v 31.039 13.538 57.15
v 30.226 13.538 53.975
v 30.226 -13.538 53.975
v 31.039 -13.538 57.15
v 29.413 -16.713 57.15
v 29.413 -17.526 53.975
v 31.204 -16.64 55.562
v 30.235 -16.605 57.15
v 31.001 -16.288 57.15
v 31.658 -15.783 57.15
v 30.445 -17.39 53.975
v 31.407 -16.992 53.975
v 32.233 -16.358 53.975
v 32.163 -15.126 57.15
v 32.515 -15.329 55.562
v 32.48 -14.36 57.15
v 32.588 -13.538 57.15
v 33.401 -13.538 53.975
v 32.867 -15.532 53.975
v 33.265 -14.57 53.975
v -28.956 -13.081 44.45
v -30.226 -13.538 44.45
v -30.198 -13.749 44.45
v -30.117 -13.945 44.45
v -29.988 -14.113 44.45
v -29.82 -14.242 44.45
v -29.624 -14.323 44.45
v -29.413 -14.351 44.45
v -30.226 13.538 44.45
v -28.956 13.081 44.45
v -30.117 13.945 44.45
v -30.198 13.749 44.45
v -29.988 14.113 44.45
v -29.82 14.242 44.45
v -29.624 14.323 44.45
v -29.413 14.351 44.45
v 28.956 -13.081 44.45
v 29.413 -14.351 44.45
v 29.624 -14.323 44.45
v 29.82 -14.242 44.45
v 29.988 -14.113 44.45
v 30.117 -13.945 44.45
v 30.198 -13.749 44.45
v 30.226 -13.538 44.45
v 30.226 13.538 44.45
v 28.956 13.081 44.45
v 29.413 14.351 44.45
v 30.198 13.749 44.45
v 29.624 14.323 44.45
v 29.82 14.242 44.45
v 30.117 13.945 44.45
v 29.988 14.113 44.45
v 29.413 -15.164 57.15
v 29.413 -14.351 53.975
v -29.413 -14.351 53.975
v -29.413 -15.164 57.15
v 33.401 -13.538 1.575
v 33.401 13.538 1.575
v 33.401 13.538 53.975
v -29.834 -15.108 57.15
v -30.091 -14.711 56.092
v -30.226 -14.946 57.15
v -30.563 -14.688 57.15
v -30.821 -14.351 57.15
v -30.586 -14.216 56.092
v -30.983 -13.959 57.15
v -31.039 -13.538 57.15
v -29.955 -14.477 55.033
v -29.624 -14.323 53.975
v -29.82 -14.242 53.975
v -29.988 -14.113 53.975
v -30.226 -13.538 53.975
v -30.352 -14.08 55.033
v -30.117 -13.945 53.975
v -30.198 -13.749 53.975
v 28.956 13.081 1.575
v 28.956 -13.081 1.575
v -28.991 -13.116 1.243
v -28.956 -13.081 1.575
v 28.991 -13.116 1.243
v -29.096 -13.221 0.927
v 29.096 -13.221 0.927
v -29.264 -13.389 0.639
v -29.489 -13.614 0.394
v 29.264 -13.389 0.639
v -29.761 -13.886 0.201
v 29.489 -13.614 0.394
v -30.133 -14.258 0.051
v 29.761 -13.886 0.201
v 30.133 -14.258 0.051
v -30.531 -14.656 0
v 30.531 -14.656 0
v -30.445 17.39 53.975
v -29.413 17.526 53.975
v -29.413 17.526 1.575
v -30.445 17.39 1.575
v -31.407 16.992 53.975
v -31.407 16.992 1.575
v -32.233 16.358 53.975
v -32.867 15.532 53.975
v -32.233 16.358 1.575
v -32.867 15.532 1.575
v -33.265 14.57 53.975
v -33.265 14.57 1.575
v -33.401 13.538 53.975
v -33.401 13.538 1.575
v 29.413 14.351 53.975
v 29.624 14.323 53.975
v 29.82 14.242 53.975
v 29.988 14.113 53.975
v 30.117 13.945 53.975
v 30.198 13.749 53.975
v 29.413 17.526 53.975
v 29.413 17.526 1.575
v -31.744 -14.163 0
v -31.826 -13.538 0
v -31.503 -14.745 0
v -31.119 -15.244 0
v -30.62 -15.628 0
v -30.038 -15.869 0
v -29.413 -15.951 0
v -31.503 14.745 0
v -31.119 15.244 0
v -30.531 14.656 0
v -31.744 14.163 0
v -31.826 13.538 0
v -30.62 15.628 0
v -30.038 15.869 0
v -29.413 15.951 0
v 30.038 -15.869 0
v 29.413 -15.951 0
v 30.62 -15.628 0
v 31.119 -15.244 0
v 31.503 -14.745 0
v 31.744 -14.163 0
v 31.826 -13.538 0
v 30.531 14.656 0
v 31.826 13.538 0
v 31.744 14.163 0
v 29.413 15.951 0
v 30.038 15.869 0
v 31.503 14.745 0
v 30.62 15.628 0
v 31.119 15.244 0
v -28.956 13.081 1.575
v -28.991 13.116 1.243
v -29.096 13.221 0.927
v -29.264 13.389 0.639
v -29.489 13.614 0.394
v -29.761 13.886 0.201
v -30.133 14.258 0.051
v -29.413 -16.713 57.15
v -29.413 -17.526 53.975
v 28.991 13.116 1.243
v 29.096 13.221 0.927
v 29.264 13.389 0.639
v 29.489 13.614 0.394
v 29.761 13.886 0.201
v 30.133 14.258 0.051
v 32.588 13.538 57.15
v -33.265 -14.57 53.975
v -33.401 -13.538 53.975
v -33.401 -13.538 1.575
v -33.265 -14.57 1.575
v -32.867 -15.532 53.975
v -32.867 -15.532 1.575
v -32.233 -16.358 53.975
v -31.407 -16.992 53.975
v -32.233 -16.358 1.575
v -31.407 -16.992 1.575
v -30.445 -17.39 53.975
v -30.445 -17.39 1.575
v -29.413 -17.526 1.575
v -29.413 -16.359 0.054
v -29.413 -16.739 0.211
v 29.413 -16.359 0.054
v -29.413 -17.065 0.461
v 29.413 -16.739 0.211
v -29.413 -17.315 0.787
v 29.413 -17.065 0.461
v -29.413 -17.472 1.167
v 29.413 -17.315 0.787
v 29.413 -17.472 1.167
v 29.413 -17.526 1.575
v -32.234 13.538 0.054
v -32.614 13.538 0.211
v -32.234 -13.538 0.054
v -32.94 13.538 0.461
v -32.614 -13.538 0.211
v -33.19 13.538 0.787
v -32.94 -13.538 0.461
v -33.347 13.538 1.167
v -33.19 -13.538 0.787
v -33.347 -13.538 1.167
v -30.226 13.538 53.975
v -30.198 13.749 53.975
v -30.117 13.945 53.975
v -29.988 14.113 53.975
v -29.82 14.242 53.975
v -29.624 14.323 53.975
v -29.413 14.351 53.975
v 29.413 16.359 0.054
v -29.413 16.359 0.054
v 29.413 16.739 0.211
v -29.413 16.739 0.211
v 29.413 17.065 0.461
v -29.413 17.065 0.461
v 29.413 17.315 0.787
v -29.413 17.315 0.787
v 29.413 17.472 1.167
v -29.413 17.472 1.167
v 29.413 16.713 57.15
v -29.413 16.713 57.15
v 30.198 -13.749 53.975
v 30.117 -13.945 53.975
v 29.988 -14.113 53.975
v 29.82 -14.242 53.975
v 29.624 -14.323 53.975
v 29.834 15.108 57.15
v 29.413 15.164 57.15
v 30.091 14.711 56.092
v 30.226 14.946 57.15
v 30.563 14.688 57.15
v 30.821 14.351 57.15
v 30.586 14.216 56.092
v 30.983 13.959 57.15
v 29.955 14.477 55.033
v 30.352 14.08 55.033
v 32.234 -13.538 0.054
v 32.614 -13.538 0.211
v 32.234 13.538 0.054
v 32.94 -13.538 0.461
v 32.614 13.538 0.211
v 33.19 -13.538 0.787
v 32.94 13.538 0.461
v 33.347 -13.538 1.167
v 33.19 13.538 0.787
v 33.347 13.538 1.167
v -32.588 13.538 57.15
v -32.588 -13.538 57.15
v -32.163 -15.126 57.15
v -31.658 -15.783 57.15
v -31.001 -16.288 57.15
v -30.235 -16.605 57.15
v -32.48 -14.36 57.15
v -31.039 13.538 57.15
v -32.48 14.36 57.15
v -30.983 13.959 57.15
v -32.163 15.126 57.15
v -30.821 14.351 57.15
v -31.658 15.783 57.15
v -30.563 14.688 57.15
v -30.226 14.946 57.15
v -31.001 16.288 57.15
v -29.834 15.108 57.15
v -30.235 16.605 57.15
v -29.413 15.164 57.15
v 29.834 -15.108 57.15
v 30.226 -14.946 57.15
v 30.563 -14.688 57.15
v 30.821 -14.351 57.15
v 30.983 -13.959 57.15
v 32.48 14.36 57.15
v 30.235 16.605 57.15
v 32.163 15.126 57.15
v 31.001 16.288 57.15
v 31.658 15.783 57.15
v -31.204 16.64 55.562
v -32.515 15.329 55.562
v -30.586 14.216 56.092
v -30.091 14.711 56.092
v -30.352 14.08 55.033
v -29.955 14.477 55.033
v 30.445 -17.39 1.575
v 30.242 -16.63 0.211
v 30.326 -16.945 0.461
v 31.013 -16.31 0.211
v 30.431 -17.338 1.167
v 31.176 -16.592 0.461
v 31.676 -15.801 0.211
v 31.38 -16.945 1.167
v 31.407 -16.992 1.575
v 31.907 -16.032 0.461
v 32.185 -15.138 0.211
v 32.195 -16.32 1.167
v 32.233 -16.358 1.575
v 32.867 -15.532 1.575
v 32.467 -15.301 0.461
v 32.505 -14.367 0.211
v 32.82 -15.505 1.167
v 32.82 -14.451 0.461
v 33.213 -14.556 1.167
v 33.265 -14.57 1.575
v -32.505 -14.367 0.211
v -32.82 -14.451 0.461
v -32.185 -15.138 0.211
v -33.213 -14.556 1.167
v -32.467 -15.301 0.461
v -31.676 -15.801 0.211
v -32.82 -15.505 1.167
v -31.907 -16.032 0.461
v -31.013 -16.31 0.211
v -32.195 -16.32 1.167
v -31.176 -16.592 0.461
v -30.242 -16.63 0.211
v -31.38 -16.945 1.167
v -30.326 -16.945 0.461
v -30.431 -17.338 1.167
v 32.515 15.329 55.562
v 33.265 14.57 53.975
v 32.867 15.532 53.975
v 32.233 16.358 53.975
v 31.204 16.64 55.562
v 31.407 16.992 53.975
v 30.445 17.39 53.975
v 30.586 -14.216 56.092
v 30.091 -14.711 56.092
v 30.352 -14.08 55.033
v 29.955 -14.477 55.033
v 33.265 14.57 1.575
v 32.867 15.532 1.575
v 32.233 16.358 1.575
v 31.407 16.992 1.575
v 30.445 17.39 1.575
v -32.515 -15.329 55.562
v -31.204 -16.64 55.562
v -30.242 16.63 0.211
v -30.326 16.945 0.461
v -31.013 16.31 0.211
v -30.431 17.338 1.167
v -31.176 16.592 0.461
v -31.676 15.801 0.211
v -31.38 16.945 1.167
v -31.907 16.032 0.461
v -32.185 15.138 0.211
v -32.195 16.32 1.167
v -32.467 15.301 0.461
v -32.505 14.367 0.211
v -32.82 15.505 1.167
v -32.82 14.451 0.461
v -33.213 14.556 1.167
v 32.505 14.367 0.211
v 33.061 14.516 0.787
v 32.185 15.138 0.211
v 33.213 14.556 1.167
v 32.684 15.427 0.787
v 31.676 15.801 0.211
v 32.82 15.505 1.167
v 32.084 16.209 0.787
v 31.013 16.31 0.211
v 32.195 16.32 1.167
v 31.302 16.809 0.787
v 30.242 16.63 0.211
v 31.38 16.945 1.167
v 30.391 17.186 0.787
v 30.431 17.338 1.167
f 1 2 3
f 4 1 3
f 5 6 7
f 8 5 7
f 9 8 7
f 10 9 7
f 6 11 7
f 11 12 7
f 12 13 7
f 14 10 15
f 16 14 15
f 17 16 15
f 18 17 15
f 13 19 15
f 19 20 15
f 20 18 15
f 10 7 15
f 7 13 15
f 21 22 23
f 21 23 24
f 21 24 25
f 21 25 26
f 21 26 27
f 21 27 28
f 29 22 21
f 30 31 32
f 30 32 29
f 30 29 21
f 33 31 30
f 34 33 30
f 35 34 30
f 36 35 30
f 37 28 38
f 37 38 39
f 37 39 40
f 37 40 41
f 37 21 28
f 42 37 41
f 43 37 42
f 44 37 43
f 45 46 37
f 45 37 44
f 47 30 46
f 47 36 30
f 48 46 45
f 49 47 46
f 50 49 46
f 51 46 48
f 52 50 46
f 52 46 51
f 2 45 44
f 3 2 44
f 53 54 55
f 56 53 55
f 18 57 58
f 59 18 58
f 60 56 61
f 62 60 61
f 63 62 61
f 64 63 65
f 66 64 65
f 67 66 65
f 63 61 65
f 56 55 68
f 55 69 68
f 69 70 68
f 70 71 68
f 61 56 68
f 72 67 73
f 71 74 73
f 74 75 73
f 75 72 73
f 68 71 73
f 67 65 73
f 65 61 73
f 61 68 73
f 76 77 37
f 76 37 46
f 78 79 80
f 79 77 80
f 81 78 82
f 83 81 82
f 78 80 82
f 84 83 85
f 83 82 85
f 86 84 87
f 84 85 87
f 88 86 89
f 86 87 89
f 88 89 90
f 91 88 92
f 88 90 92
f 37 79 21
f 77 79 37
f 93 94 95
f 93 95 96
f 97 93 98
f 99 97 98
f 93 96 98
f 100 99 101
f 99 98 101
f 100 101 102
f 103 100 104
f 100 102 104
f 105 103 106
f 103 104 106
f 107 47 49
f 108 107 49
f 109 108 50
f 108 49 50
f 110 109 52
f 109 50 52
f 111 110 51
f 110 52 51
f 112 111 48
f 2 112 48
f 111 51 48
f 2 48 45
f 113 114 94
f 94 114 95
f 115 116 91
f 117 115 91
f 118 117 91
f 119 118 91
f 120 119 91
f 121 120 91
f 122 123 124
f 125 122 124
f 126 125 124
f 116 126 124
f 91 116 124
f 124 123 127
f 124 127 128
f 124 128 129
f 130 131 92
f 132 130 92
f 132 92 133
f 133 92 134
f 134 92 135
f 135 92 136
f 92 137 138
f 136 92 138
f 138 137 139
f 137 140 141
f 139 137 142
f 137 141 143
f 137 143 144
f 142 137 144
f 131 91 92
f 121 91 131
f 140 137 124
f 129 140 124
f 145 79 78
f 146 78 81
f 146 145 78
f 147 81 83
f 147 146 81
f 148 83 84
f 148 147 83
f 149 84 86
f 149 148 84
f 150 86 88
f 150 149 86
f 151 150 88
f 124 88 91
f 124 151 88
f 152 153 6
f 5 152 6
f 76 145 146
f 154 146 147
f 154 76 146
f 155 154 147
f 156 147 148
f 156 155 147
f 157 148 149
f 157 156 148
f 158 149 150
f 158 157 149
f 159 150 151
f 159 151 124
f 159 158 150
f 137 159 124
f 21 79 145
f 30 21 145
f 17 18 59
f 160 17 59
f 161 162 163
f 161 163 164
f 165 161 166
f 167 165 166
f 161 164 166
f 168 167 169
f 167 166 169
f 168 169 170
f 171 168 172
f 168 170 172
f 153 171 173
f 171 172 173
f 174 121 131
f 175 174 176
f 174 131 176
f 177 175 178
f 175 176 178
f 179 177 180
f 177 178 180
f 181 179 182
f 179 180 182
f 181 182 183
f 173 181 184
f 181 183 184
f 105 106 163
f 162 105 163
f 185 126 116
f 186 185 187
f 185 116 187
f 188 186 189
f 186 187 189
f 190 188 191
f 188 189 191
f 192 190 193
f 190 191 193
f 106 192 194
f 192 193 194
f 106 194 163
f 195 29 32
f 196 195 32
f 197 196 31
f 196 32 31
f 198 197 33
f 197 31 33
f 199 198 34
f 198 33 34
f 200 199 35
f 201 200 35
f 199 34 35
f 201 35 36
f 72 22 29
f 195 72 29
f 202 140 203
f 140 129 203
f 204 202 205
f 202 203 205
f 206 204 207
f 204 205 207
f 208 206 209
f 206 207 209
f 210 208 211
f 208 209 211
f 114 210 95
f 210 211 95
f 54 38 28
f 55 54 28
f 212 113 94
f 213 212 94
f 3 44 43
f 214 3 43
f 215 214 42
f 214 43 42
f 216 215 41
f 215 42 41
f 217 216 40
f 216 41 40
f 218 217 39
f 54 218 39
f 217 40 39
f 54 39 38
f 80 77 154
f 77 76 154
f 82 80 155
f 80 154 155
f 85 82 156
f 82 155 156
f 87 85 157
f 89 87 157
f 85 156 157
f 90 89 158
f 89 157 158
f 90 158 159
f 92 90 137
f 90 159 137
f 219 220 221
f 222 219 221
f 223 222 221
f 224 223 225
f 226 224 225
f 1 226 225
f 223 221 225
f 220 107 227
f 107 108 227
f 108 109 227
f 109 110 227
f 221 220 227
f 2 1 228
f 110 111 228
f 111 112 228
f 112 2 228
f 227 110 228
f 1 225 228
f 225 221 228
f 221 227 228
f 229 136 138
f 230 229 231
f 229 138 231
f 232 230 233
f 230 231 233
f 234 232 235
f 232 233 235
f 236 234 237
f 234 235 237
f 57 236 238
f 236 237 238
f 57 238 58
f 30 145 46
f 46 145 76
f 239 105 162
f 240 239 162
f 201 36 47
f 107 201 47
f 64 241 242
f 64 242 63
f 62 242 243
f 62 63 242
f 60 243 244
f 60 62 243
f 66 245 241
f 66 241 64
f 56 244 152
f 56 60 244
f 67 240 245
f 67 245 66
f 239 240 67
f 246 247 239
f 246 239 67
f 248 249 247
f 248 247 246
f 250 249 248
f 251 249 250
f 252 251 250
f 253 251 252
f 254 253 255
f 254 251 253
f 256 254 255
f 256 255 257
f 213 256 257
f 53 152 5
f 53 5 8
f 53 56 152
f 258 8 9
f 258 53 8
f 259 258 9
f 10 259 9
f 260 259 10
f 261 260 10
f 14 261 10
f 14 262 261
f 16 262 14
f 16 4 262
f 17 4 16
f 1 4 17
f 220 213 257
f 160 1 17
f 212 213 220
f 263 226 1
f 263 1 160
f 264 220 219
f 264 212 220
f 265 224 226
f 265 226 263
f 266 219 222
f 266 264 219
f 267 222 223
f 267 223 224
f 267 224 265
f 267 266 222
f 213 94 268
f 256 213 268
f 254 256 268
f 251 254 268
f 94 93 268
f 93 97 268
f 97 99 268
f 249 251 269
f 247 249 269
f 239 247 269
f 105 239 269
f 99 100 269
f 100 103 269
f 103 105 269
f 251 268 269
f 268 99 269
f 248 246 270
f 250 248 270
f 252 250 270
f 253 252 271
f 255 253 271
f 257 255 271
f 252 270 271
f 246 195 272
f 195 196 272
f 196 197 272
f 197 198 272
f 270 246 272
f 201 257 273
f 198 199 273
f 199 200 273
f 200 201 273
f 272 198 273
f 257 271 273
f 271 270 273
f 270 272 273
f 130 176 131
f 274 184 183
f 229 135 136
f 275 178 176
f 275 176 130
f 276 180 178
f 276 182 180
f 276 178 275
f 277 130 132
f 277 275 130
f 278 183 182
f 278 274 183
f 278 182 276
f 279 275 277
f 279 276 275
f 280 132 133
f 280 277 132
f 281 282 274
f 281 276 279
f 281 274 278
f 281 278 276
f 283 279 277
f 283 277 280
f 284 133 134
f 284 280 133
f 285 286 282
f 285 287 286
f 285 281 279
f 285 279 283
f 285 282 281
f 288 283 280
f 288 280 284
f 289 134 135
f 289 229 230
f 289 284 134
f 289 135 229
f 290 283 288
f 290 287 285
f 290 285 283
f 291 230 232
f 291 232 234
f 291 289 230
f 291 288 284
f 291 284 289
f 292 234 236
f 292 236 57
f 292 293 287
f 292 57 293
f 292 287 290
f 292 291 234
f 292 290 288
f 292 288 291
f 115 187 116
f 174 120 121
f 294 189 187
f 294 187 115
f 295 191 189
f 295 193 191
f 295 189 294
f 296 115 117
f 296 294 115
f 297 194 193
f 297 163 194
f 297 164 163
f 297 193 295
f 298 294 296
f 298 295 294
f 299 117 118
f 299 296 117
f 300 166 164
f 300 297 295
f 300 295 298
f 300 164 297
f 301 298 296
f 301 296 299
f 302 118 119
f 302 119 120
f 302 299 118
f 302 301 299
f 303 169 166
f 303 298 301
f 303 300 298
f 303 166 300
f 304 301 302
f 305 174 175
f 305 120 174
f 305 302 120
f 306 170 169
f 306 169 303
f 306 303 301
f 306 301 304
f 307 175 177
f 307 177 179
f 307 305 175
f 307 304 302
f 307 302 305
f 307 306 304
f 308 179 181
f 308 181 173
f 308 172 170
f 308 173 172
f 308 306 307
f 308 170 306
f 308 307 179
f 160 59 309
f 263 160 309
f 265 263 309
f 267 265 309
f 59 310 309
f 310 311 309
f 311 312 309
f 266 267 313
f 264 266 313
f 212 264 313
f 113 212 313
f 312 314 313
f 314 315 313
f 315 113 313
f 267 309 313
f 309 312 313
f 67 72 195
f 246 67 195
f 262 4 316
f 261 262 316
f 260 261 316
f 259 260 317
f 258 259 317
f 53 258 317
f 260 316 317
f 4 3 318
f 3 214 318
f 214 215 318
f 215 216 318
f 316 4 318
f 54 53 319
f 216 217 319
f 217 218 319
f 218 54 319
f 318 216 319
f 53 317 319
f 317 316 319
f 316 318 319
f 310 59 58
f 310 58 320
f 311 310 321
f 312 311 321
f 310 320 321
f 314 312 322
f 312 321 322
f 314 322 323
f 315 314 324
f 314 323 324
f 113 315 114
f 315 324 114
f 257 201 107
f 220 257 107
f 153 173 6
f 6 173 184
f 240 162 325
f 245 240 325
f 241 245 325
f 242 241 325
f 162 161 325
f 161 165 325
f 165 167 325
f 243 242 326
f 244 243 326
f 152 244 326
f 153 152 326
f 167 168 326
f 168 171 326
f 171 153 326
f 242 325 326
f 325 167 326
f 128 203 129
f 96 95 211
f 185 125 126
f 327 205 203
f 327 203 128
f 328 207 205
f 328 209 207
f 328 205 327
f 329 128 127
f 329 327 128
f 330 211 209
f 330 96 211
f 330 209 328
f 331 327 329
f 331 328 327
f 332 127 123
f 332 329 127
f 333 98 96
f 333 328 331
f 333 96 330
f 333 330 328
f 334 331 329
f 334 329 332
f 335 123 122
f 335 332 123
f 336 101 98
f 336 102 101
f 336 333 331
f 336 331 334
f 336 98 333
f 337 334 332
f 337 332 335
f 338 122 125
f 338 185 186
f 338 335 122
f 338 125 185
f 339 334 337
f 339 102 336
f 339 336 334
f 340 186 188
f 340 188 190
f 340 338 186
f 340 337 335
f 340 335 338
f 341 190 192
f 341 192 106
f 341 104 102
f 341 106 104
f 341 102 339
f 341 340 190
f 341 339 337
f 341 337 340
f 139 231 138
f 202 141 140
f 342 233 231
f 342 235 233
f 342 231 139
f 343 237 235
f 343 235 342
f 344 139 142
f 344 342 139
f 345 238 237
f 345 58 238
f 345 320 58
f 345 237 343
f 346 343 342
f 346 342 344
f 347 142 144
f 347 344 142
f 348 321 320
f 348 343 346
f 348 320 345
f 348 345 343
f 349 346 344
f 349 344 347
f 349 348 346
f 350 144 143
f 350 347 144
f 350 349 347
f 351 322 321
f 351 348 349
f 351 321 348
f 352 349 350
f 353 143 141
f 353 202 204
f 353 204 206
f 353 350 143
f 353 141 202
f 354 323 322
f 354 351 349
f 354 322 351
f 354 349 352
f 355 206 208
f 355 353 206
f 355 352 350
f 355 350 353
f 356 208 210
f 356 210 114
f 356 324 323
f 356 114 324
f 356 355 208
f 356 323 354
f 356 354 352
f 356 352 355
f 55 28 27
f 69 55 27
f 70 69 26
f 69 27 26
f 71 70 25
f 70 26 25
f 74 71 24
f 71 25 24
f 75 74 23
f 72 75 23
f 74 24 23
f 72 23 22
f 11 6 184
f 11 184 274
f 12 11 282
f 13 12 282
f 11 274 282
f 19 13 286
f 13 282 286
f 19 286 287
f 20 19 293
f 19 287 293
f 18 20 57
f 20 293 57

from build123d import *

# Parameters (mm, degrees)
F1_DEPTH = 57.15
F0_W     = 57.912
F0_H     = 26.162
F2_DEPTH = 44.45
F3_SIZE2 = 3.175
F3_SIZE  = 0.8128
F4_R     = 1.5748


with BuildPart() as f1:
    # F0 (on Top) → F1 (new body)
    with BuildSketch(Plane.XY):
        with BuildLine():
            Line((29.4132, 17.526), (-29.4132, 17.526))
            ThreePointArc((-29.4132, 17.526), (-32.233000422, 16.358000422), (-33.401, 13.5382))
            Line((-33.401, 13.5382), (-33.401, -13.5382))
            ThreePointArc((-33.401, -13.5382), (-32.233000422, -16.358000422), (-29.4132, -17.526))
            Line((-29.4132, -17.526), (29.4132, -17.526))
            ThreePointArc((29.4132, -17.526), (32.233000422, -16.358000422), (33.401, -13.5382))
            Line((33.401, -13.5382), (33.401, 13.5382))
            ThreePointArc((33.401, 13.5382), (32.233000422, 16.358000422), (29.4132, 17.526))
        make_face()
        with BuildLine():
            Line((-29.4132, 14.351), (29.4132, 14.351))
            ThreePointArc((29.4132, 14.351), (29.9879363917, 14.1129363917), (30.226, 13.5382))
            Line((30.226, 13.5382), (30.226, -13.5382))
            ThreePointArc((30.226, -13.5382), (29.9879363917, -14.1129363917), (29.4132, -14.351))
            Line((29.4132, -14.351), (-29.4132, -14.351))
            ThreePointArc((-29.4132, -14.351), (-29.9879363917, -14.1129363917), (-30.226, -13.5382))
            Line((-30.226, -13.5382), (-30.226, 13.5382))
            ThreePointArc((-30.226, 13.5382), (-29.9879363917, 14.1129363917), (-29.4132, 14.351))
        make_face(mode=Mode.SUBTRACT)
    extrude(amount=F1_DEPTH)

    # F0 (on Top) → F2 (join)
    with BuildSketch(Plane.XY):
        with BuildLine():
            ThreePointArc((30.226, 13.5382), (29.9879363917, 14.1129363917), (29.4132, 14.351))
            Line((29.4132, 14.351), (-29.4132, 14.351))
            ThreePointArc((-29.4132, 14.351), (-29.9879363917, 14.1129363917), (-30.226, 13.5382))
            Line((-30.226, 13.5382), (-30.226, -13.5382))
            ThreePointArc((-30.226, -13.5382), (-29.9879363917, -14.1129363917), (-29.4132, -14.351))
            Line((-29.4132, -14.351), (29.4132, -14.351))
            ThreePointArc((29.4132, -14.351), (29.9879363917, -14.1129363917), (30.226, -13.5382))
            Line((30.226, -13.5382), (30.226, 13.5382))
        make_face()
        Rectangle(F0_W, F0_H, mode=Mode.SUBTRACT)
    extrude(amount=F2_DEPTH)

    # F3
    f3_edges = [f1.edges().sort_by_distance(p)[0] for p in [
        (0, 17.526, 57.15),
        (-32.233, 16.358, 57.15),
        (-33.401, 0, 57.15),
        (-32.233, -16.358, 57.15),
        (0, -17.526, 57.15),
        (32.233, -16.358, 57.15),
        (33.401, 0, 57.15),
        (32.233, 16.358, 57.15),
        (0, 14.351, 57.15),
        (29.987936, 14.112936, 57.15),
        (30.226, 0, 57.15),
        (29.987936, -14.112936, 57.15),
        (0, -14.351, 57.15),
        (-29.987936, -14.112936, 57.15),
        (-30.226, 0, 57.15),
        (-29.987936, 14.112936, 57.15),
    ]]
    f3_side = f1.faces().sort_by_distance((0, 16.771603, 57.15))[0]
    chamfer(f3_edges, length=F3_SIZE, length2=F3_SIZE2, reference=f3_side)

    # F4
    f4_edges = [f1.edges().sort_by_distance(p)[0] for p in [
        (0, 17.526, 0),
        (-32.233, 16.358, 0),
        (-33.401, 0, 0),
        (-32.233, -16.358, 0),
        (0, -17.526, 0),
        (32.233, -16.358, 0),
        (33.401, 0, 0),
        (32.233, 16.358, 0),
        (0, -13.081, 0),
        (-28.956, 0, 0),
        (0, 13.081, 0),
        (28.956, 0, 0),
    ]]
    fillet(f4_edges, radius=F4_R)


solid = f1.part
